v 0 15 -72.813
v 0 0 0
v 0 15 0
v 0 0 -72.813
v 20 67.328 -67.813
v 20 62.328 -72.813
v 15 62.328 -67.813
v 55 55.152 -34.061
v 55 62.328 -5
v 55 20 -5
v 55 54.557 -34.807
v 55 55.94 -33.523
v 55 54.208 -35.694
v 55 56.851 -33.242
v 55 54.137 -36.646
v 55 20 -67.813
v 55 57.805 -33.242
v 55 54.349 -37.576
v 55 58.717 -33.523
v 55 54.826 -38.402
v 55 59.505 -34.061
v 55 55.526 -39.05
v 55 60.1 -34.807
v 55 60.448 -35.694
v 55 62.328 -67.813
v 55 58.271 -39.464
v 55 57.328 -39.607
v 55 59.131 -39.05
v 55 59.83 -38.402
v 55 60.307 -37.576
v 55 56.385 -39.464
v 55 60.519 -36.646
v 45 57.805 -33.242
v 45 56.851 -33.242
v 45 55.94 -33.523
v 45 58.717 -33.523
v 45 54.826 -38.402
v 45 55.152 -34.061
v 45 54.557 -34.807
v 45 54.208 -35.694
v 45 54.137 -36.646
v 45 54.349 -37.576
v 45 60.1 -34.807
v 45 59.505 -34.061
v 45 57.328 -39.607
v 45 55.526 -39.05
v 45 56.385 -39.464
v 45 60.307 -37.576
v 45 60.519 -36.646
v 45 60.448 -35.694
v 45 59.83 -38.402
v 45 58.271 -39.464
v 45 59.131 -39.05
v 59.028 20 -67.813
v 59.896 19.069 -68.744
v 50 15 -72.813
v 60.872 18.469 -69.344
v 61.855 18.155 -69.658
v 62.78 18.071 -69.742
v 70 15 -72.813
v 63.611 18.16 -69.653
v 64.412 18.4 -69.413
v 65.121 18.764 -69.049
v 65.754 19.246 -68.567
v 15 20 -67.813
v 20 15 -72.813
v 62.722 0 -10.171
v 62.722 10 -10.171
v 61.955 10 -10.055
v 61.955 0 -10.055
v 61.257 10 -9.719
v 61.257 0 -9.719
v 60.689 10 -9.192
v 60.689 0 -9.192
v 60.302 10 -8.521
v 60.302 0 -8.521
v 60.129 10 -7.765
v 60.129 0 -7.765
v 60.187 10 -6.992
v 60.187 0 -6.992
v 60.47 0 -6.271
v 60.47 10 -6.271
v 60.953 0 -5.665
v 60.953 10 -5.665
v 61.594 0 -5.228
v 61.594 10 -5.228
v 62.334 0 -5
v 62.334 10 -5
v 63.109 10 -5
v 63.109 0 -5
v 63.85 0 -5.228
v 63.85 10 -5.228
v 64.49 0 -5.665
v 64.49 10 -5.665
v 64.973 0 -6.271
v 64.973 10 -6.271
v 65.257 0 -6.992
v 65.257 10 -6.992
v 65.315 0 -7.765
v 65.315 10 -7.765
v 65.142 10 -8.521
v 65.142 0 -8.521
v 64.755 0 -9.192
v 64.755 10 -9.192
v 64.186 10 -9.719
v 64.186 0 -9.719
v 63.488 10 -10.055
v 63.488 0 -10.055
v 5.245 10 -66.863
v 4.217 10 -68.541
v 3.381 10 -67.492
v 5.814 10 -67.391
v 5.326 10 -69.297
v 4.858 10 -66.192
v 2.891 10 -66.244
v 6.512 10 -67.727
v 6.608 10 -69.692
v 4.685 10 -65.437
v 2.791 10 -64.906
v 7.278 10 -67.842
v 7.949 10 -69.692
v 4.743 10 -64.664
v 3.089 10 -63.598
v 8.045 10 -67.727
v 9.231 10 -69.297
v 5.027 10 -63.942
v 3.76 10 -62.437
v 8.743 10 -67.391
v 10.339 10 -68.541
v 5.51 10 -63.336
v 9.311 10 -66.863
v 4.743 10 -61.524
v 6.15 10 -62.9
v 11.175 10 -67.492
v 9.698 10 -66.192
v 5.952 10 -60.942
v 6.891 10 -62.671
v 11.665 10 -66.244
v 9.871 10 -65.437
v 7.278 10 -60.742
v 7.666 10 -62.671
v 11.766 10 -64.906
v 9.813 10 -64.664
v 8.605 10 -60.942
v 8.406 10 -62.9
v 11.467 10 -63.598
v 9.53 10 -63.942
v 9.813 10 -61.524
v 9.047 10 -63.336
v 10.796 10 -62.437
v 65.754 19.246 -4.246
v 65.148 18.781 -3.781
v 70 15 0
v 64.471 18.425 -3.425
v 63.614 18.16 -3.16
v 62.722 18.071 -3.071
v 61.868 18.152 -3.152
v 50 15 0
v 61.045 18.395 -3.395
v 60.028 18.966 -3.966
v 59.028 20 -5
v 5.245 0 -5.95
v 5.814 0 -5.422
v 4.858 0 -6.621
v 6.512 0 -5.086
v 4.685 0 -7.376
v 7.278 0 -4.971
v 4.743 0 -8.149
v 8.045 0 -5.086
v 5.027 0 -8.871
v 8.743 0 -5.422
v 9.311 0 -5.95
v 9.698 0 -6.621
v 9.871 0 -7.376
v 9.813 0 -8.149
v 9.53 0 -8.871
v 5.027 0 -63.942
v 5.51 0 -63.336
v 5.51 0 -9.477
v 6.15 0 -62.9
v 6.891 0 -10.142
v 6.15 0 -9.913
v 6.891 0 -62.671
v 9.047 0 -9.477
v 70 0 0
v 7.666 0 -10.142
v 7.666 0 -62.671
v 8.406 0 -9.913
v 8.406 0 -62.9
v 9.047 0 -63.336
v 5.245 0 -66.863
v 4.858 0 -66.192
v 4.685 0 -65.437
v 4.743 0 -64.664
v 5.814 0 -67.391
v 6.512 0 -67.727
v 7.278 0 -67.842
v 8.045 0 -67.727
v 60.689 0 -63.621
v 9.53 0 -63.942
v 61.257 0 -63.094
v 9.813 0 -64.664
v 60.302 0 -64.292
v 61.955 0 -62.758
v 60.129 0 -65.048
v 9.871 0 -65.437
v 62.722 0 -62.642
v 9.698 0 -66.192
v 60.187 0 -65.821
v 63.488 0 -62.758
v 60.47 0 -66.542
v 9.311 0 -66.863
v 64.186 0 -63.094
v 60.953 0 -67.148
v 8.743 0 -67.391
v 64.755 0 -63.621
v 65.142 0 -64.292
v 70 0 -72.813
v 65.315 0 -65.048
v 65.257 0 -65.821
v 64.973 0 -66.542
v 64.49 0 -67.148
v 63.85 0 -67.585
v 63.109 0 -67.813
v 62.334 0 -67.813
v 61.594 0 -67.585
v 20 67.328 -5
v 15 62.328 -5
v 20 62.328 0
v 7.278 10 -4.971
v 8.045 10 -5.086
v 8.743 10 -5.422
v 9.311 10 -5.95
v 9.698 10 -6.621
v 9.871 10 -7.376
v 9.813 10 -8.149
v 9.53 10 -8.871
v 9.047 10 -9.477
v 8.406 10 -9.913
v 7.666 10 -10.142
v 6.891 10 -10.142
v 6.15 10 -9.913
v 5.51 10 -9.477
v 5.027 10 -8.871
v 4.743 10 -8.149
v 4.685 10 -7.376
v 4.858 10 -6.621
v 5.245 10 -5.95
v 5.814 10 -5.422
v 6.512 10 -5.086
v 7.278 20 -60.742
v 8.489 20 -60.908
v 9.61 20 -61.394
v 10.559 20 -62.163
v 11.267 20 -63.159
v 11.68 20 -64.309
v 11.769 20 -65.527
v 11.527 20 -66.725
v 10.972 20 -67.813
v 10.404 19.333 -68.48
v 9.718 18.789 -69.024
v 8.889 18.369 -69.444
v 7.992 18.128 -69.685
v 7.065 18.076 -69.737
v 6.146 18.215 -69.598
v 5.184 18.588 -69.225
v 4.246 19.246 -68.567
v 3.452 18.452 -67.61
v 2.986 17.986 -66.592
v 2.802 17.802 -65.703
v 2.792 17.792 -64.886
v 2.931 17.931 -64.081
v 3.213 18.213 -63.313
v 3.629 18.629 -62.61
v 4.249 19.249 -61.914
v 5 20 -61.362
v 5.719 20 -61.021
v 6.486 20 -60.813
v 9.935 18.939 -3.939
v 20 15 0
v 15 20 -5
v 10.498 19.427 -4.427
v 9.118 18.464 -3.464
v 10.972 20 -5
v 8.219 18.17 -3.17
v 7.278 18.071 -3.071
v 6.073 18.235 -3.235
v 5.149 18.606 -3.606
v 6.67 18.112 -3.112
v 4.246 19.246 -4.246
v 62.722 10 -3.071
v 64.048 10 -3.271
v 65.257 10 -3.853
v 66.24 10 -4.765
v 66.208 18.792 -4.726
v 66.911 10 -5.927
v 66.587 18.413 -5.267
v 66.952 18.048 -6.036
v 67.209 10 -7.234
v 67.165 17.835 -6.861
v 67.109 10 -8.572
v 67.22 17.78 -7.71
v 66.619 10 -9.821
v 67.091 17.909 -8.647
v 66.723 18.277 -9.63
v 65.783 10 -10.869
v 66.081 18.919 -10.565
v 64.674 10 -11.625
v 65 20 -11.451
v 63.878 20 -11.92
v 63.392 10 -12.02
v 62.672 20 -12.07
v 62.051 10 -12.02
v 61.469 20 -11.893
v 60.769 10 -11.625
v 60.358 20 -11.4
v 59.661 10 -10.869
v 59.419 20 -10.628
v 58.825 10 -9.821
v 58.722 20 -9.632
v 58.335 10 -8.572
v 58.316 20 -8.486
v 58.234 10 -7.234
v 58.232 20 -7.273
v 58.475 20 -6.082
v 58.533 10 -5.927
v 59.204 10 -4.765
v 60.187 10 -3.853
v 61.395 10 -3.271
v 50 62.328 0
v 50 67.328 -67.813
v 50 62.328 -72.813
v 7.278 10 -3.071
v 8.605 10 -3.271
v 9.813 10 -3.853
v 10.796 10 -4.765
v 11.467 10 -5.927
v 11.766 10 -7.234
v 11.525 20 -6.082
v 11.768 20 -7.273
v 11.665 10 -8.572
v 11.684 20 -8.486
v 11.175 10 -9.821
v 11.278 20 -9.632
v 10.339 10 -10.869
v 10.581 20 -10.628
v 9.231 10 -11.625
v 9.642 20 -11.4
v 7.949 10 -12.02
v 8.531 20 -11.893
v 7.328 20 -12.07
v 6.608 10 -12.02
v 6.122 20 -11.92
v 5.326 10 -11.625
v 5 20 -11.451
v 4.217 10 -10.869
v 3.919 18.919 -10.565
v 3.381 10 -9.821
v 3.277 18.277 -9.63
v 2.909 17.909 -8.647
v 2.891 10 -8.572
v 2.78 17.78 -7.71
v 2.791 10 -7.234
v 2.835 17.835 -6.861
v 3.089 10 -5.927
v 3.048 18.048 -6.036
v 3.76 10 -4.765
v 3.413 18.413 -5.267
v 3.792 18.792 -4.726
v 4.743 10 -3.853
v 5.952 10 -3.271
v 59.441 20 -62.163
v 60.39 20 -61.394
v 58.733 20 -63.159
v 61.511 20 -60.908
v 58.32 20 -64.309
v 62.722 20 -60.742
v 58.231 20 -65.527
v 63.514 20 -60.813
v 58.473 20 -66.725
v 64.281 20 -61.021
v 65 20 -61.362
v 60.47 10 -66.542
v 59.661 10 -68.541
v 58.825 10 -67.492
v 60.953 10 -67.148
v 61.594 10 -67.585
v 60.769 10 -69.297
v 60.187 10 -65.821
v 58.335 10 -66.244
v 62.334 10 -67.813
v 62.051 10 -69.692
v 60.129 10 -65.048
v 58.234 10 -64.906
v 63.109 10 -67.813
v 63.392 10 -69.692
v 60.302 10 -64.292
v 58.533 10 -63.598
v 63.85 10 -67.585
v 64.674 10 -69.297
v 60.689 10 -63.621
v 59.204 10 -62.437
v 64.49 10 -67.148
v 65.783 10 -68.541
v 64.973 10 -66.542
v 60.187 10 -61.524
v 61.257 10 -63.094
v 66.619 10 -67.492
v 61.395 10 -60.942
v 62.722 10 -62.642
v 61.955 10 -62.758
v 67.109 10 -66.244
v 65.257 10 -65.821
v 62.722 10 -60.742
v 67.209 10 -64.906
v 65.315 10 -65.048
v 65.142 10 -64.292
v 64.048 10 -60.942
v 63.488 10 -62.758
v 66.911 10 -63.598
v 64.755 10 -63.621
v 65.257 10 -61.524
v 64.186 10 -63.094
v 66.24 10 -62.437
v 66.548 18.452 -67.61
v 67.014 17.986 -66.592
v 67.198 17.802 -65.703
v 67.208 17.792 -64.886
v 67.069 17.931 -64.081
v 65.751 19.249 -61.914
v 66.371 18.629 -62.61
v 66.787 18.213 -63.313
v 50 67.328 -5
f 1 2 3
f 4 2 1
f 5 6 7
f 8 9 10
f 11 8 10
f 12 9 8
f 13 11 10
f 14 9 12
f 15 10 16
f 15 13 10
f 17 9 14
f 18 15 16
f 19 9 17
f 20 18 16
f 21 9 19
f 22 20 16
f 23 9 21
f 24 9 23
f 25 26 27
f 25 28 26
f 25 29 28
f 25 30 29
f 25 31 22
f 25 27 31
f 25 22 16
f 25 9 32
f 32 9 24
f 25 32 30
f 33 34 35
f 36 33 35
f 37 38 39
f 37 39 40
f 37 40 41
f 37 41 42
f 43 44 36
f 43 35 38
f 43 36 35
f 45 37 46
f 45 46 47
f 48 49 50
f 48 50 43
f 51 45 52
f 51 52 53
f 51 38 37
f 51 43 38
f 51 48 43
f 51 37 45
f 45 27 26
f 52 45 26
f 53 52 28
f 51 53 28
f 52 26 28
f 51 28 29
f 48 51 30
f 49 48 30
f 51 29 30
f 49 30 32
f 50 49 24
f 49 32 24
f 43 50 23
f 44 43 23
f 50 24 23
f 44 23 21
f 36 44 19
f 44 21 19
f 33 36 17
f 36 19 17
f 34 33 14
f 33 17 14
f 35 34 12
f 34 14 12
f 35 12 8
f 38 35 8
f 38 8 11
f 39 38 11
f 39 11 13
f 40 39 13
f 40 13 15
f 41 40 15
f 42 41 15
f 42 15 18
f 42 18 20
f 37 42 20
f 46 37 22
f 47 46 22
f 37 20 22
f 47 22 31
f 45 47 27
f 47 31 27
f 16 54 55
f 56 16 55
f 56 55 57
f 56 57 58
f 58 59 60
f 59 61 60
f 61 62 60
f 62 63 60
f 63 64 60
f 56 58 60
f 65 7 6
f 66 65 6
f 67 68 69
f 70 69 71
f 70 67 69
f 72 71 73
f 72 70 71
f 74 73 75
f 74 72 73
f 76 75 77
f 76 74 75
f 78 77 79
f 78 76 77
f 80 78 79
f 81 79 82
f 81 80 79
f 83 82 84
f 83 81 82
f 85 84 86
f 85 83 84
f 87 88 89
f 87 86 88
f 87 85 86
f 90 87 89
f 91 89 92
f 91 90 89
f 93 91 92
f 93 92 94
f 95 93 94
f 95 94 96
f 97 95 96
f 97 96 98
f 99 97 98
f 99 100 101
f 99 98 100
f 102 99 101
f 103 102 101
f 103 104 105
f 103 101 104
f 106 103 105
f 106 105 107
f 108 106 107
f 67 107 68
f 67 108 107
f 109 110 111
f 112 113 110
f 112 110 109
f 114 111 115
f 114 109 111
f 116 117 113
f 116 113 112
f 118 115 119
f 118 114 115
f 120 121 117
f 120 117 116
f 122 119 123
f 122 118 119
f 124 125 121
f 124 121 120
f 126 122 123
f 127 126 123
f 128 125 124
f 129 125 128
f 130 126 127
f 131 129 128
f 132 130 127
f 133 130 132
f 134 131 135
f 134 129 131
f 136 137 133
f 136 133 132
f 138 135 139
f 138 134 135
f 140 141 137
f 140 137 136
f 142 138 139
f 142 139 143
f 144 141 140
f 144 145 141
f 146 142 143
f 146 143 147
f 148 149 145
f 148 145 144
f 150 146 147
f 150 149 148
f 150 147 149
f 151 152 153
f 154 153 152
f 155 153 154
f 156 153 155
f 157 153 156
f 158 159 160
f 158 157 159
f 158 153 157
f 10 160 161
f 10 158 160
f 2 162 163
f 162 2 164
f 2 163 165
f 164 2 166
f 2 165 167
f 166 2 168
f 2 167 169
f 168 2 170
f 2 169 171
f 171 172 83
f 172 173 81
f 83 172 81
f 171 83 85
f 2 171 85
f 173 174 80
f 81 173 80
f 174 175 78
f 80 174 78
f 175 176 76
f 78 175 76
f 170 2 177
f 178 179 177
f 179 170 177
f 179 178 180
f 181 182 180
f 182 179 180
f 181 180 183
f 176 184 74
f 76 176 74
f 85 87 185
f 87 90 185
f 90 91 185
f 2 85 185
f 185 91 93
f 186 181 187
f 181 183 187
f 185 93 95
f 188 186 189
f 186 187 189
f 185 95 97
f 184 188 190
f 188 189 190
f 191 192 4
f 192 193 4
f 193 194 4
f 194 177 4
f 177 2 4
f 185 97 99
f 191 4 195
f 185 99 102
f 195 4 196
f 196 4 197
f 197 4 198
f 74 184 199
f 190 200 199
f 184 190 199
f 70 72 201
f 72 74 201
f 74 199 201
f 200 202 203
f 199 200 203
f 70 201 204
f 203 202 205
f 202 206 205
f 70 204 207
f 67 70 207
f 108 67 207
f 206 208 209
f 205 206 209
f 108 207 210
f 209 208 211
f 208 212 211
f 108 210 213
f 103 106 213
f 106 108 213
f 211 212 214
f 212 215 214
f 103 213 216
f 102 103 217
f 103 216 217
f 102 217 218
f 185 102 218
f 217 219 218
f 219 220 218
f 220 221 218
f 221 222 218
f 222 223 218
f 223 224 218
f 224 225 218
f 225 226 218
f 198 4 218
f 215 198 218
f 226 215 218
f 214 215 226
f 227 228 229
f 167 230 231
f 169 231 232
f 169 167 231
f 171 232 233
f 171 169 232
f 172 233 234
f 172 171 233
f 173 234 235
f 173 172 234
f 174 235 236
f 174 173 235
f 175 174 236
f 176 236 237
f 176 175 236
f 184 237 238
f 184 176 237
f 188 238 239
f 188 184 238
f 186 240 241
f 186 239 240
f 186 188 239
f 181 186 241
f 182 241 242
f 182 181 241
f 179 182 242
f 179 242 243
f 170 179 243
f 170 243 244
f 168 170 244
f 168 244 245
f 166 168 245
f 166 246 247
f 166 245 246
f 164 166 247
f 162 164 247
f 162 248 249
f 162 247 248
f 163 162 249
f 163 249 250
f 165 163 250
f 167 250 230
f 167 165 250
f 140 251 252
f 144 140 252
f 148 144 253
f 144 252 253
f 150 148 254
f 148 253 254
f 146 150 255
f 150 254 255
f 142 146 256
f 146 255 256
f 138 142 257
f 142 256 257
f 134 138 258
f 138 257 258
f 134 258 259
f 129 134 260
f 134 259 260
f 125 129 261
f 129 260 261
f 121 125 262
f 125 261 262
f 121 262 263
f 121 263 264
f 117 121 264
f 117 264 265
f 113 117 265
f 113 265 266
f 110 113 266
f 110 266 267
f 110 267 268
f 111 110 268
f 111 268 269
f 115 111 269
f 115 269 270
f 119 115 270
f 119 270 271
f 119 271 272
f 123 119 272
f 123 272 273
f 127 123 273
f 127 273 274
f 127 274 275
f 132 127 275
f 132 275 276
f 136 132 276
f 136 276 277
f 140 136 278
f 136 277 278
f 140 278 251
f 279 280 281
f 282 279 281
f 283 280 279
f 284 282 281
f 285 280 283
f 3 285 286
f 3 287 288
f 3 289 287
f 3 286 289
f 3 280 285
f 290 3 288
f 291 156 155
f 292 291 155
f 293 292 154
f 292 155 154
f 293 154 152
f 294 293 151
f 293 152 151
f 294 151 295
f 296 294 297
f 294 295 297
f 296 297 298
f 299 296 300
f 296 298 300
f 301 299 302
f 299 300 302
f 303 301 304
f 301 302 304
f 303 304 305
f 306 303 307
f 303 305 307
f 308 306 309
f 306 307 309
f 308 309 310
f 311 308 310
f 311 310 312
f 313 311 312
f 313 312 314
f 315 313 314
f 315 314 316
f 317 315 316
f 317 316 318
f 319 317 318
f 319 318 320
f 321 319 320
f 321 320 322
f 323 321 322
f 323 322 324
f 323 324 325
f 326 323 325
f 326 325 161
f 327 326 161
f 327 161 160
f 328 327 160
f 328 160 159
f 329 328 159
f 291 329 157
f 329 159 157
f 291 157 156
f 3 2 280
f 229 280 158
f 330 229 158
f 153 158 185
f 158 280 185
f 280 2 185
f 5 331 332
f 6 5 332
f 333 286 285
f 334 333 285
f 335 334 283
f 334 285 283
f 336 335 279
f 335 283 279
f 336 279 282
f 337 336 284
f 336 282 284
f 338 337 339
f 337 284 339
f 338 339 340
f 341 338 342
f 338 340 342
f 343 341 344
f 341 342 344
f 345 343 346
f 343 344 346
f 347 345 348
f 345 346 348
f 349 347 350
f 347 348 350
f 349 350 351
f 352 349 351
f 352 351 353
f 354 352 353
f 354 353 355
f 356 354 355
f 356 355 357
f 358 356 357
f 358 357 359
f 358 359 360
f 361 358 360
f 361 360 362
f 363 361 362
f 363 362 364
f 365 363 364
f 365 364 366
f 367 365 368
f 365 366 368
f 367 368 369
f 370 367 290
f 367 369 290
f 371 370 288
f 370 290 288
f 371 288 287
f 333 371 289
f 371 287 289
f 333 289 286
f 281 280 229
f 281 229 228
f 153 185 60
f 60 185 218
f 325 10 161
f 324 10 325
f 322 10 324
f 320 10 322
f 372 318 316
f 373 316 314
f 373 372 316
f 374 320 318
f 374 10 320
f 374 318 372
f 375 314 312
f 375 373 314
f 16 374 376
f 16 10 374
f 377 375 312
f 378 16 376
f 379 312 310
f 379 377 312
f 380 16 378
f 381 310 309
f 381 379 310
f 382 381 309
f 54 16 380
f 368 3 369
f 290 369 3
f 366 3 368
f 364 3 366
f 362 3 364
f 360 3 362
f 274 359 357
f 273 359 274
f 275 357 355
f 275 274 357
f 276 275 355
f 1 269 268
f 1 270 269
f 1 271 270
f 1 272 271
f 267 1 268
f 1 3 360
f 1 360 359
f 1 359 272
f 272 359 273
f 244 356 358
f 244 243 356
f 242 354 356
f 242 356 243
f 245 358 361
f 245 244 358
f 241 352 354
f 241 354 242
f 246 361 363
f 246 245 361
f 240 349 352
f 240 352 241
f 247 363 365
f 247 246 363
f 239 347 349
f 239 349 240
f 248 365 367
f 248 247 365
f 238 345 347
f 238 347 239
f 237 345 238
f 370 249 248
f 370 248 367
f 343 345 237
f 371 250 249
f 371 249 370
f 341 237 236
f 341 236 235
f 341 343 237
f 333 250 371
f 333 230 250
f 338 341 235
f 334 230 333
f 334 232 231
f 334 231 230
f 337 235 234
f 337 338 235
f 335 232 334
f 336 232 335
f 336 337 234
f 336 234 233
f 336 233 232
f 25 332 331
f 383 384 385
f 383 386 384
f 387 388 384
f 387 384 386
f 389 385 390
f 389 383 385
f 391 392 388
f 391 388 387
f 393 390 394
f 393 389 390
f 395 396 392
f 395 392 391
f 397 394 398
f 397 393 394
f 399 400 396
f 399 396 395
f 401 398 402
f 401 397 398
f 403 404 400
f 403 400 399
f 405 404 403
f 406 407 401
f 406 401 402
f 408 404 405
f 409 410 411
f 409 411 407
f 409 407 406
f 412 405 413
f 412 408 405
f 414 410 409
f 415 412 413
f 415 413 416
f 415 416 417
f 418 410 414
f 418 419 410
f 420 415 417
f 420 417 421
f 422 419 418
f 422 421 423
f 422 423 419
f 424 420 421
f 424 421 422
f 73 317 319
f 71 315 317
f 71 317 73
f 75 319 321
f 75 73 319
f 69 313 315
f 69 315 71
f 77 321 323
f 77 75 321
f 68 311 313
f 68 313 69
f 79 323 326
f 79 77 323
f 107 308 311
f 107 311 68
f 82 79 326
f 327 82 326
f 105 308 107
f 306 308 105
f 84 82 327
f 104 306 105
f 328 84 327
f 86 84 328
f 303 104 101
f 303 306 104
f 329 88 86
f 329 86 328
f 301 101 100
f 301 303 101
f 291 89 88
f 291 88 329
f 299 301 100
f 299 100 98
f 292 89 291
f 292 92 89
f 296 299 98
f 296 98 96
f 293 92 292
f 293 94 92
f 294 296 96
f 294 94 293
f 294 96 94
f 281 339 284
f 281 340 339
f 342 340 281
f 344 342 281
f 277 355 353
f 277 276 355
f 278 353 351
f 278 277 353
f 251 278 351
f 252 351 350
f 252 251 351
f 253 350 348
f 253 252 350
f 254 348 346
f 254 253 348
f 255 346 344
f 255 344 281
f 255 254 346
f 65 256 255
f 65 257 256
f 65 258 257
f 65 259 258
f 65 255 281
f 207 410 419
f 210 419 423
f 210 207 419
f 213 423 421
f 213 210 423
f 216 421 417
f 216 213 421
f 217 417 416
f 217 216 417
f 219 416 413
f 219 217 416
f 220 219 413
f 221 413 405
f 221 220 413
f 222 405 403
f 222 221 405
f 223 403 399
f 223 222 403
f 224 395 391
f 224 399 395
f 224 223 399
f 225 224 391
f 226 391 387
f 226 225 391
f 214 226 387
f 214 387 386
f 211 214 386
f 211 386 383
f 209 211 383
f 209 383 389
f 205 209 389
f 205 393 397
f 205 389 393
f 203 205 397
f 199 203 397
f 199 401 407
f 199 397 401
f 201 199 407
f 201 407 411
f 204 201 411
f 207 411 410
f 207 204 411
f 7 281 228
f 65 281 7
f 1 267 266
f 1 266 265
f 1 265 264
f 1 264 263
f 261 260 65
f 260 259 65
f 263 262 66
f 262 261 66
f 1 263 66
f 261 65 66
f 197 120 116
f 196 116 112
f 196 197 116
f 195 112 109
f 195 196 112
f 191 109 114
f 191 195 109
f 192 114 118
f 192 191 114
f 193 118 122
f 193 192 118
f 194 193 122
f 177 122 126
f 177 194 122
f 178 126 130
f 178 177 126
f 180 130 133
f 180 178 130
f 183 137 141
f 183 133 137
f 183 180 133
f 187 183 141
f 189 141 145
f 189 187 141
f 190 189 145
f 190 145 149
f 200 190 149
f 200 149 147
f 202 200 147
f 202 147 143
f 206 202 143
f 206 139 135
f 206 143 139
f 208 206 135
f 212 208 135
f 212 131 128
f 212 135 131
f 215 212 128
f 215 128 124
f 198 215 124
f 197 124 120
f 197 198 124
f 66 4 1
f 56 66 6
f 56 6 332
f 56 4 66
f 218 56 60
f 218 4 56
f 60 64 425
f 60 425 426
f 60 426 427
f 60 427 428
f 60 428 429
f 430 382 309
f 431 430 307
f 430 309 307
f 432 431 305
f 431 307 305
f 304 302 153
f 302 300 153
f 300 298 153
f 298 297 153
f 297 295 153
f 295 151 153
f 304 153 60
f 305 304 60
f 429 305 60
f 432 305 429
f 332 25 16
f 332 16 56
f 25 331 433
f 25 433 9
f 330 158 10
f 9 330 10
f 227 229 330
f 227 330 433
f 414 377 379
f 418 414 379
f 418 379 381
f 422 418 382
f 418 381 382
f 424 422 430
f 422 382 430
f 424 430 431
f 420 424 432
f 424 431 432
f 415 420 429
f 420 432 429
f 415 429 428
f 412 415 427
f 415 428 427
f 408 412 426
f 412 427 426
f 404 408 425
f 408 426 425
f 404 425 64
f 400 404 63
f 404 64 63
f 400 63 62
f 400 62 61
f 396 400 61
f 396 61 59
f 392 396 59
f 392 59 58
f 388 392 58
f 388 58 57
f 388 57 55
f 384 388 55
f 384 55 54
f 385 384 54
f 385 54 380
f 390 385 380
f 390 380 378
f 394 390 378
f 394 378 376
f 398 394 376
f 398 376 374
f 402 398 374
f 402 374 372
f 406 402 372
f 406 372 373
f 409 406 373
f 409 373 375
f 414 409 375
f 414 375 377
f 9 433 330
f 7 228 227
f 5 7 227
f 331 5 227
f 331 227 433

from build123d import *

# Parameters (mm, degrees)
SKETCH1_W           = 70
SKETCH1_H           = 72.813008
SKETCH1_R           = 2.6
BOSS_EXTRUDE1_DEPTH = 20
SKETCH2_R           = 4.5
CUT_EXTRUDE1_DEPTH  = 10
SKETCH3_W           = 40
SKETCH3_H           = 72.813008
BOSS_EXTRUDE2_DEPTH = 47.328226
SKETCH5_R           = 3.2
CUT_EXTRUDE2_DEPTH  = 10


with BuildPart() as part:
    # Sketch1 → Boss-Extrude1 (new body)
    with BuildSketch(Plane(origin=(0, 0, 0), x_dir=(1, 0, 0), z_dir=(0, 1, 0))):
        with Locations((35, 36.406504)):
            Rectangle(SKETCH1_W, SKETCH1_H)
        with Locations(Location((62.721774771, 65.242301259, 0), (0, 0, 270))):
            Circle(SKETCH1_R, mode=Mode.SUBTRACT)
        with Locations(Location((7.278225229, 65.242301259, 0), (0, 0, 90))):
            Circle(SKETCH1_R, mode=Mode.SUBTRACT)
        with Locations(Location((62.721774771, 7.570706741, 0), (0, 0, 90))):
            Circle(SKETCH1_R, mode=Mode.SUBTRACT)
        with Locations(Location((7.278225229, 7.570706741, 0), (0, 0, 270))):
            Circle(SKETCH1_R, mode=Mode.SUBTRACT)
    extrude(amount=BOSS_EXTRUDE1_DEPTH)

    # Sketch2 → Cut-Extrude1 (cut)
    with BuildSketch(Plane(origin=(0, 20, 0), x_dir=(1, 0, 0), z_dir=(0, 1, 0))):
        with Locations(Location((62.721774771, 65.242301259, 0), (0, 0, 270))):
            Circle(SKETCH2_R)
        with Locations(Location((7.278225229, 65.242301259, 0), (0, 0, 270))):
            Circle(SKETCH2_R)
        with Locations(Location((7.278225229, 7.570706741, 0), (0, 0, 270))):
            Circle(SKETCH2_R)
        with Locations(Location((62.721774771, 7.570706741, 0), (0, 0, 270))):
            Circle(SKETCH2_R)
    extrude(amount=-CUT_EXTRUDE1_DEPTH, mode=Mode.SUBTRACT)

    # Sketch3 → Boss-Extrude2 (add)
    with BuildSketch(Plane(origin=(0, 20, 0), x_dir=(1, 0, 0), z_dir=(0, 1, 0))):
        with Locations((35, 36.406504)):
            Rectangle(SKETCH3_W, SKETCH3_H)
    extrude(amount=BOSS_EXTRUDE2_DEPTH)

    # Sketch5 → Cut-Extrude2 (cut)
    with BuildSketch(Plane(origin=(55, 0, 0), x_dir=(0, 0, -1), z_dir=(1, 0, 0))):
        with Locations((36.406504, 57.328226)):
            Circle(SKETCH5_R)
    extrude(amount=-CUT_EXTRUDE2_DEPTH, mode=Mode.SUBTRACT)

    # Chamfer1
    # the kernel refuses this chamfer: 5 mm, written as the material it takes off along each edge
    with BuildSketch(Plane(origin=(51.666666667, 63.994892667, -3.333333333), x_dir=(0, 0.7071067811865475, -0.7071067811865475), z_dir=(0.5773502691896257, 0.5773502691896257, 0.5773502691896257)), Plane(origin=(18.333333333, 63.994892667, -3.333333333), x_dir=(-0.7071067811865475, 0, -0.7071067811865475), z_dir=(-0.5773502691896257, 0.5773502691896257, 0.5773502691896257))) as chamfer1_piece_1:
        Polygon((-3.535533906, 2.041241452), (3.535533906, 2.041241452), (0, -4.082482905), align=None)
    extrude(amount=6.350852961, mode=Mode.SUBTRACT)
    with BuildSketch(Plane(origin=(51.666666667, 63.994892667, -69.479674667), x_dir=(0, 0.7071067811865475, 0.7071067811865475), z_dir=(0.5773502691896257, 0.5773502691896257, -0.5773502691896257)), Plane(origin=(18.333333333, 63.994892667, -69.479674667), x_dir=(-0.7071067811865472, 0, 0.7071067811865478), z_dir=(-0.5773502691896258, 0.5773502691896258, -0.5773502691896255))) as chamfer1_piece_2:
        Polygon((-3.535533906, -2.041241452), (3.535533906, -2.041241452), (0, 4.082482905), align=None)
    extrude(amount=6.350852961, mode=Mode.SUBTRACT)
    with BuildSketch(Plane(origin=(70, 20, 12.85841494), x_dir=(-0.9996219169112968, 0.027495876610586282, 0), z_dir=(0, 0, -1)), Plane(origin=(15, 67.328226, 12.85841494), x_dir=(-0.027495876610586317, -0.9996219169112968, 0), z_dir=(0, 0, -1))) as chamfer1_piece_3:
        with BuildLine():
            Line((5.143365976, 0), (-0.282735774, -5.135588968))
            Line((-0.282735774, -5.135588968), (-0.382697966, -5.13283938))
            ThreePointArc((-0.382697966, -5.13283938), (-0.170646135, -2.566989148), (-0.099962192, 0.002749588))
            Line((-0.099962192, 0.002749588), (0.002749588, 0.099962192))
            ThreePointArc((0.002749588, 0.099962192), (2.572488324, 0.029278248), (5.146115564, 0.099962192))
            Line((5.146115564, 0.099962192), (5.143365976, 0))
        make_face()
    extrude(amount=98.52983788, mode=Mode.SUBTRACT)
    with BuildSketch(Plane(origin=(82.85841494, 20, -72.813008), x_dir=(0, 0.027495876610586282, 0.9996219169112968), z_dir=(-1, 0, 0)), Plane(origin=(15, 20, -72.813008), x_dir=(0, 0.027495876610586282, 0.9996219169112968), z_dir=(-1, 0, 0))) as chamfer1_piece_4:
        with BuildLine():
            Line((5.143365976, 0), (-0.282735774, -5.135588968))
            Line((-0.282735774, -5.135588968), (-0.382697966, -5.13283938))
            ThreePointArc((-0.382697966, -5.13283938), (-0.170646135, -2.566989148), (-0.099962192, 0.002749588))
            Line((-0.099962192, 0.002749588), (0.002749588, 0.099962192))
            ThreePointArc((0.002749588, 0.099962192), (2.572488324, 0.029278248), (5.146115564, 0.099962192))
            Line((5.146115564, 0.099962192), (5.143365976, 0))
        make_face()
    extrude(amount=27.85841494, mode=Mode.SUBTRACT)
    with BuildSketch(Plane(origin=(0, 20, -85.67142294), x_dir=(-0.027495876610586372, -0.9996219169112968, 0), z_dir=(0, 0, 1)), Plane(origin=(55, 67.328226, -85.67142294), x_dir=(-0.9996219169112968, 0.0274958766105877, 0), z_dir=(0, 0, 1))) as chamfer1_piece_5:
        with BuildLine():
            Line((5.143365976, 0), (-0.282735774, 5.135588968))
            Line((-0.282735774, 5.135588968), (-0.382697966, 5.13283938))
            ThreePointArc((-0.382697966, 5.13283938), (-0.170646135, 2.566989148), (-0.099962192, -0.002749588))
            Line((-0.099962192, -0.002749588), (0.002749588, -0.099962192))
            ThreePointArc((0.002749588, -0.099962192), (2.572488324, -0.029278248), (5.146115564, -0.099962192))
            Line((5.146115564, -0.099962192), (5.143365976, 0))
        make_face()
    extrude(amount=98.52983788, mode=Mode.SUBTRACT)
    with BuildSketch(Plane(origin=(55, 20, 0), x_dir=(0, -0.9996219169112968, 0.027495876610586372), z_dir=(1, 0, 0)), Plane(origin=(-12.85841494, 20, 0), x_dir=(0, -0.9996219169112968, 0.027495876610586372), z_dir=(1, 0, 0))) as chamfer1_piece_6:
        with BuildLine():
            Line((5.143365976, 0), (-0.282735774, 5.135588968))
            Line((-0.282735774, 5.135588968), (-0.382697966, 5.13283938))
            ThreePointArc((-0.382697966, 5.13283938), (-0.170646135, 2.566989148), (-0.099962192, -0.002749588))
            Line((-0.099962192, -0.002749588), (0.002749588, -0.099962192))
            ThreePointArc((0.002749588, -0.099962192), (2.572488324, -0.029278248), (5.146115564, -0.099962192))
            Line((5.146115564, -0.099962192), (5.143365976, 0))
        make_face()
    extrude(amount=27.85841494, mode=Mode.SUBTRACT)
    with BuildSketch(Plane(origin=(55, 20, 0), x_dir=(-0.9996219169112968, 0, 0.027495876610586372), z_dir=(0, 1, 0)), Plane(origin=(55, 20, -72.813008), x_dir=(0.027495876610586282, 0, 0.9996219169112968), z_dir=(0, 1, 0))) as chamfer1_piece_7:
        with BuildLine():
            Line((5.143365976, 0), (-0.282735774, -5.135588968))
            Line((-0.282735774, -5.135588968), (-0.382697966, -5.13283938))
            ThreePointArc((-0.382697966, -5.13283938), (-0.170646135, -2.566989148), (-0.099962192, 0.002749588))
            Line((-0.099962192, 0.002749588), (0.002749588, 0.099962192))
            ThreePointArc((0.002749588, 0.099962192), (2.572488324, 0.029278248), (5.146115564, 0.099962192))
            Line((5.146115564, 0.099962192), (5.143365976, 0))
        make_face()
    extrude(amount=60.18664094, mode=Mode.SUBTRACT)
    with BuildSketch(Plane(origin=(15, 20, -72.813008), x_dir=(-0.027495876610586282, 0, 0.9996219169112968), z_dir=(0, 1, 0)), Plane(origin=(15, 20, 0), x_dir=(0.9996219169112968, 0, 0.027495876610586372), z_dir=(0, 1, 0))) as chamfer1_piece_8:
        with BuildLine():
            Line((5.143365976, 0), (-0.282735774, 5.135588968))
            Line((-0.282735774, 5.135588968), (-0.382697966, 5.13283938))
            ThreePointArc((-0.382697966, 5.13283938), (-0.170646135, 2.566989148), (-0.099962192, -0.002749588))
            Line((-0.099962192, -0.002749588), (0.002749588, -0.099962192))
            ThreePointArc((0.002749588, -0.099962192), (2.572488324, -0.029278248), (5.146115564, -0.099962192))
            Line((5.146115564, -0.099962192), (5.143365976, 0))
        make_face()
    extrude(amount=60.18664094, mode=Mode.SUBTRACT)
    with BuildSketch(Plane(origin=(2.14158506, 67.328226, -72.813008), x_dir=(0, 0.027495876610587663, 0.9996219169112968), z_dir=(1, 0, 0))) as chamfer1_piece_9:
        with BuildLine():
            Line((5.143365976, 0), (-0.282735774, 5.135588968))
            Line((-0.282735774, 5.135588968), (-0.382697966, 5.13283938))
            ThreePointArc((-0.382697966, 5.13283938), (-0.170646135, 2.566989148), (-0.099962192, -0.002749588))
            Line((-0.099962192, -0.002749588), (0.002749588, -0.099962192))
            ThreePointArc((0.002749588, -0.099962192), (2.572488324, -0.029278248), (5.146115564, -0.099962192))
            Line((5.146115564, -0.099962192), (5.143365976, 0))
        make_face()
    extrude(amount=65.71682988, mode=Mode.SUBTRACT)
    with BuildSketch(Plane(origin=(67.85841494, 67.328226, 0), x_dir=(0, -0.9996219169112968, 0.027495876610586372), z_dir=(-1, 0, 0))) as chamfer1_piece_10:
        with BuildLine():
            Line((5.143365976, 0), (-0.282735774, -5.135588968))
            Line((-0.282735774, -5.135588968), (-0.382697966, -5.13283938))
            ThreePointArc((-0.382697966, -5.13283938), (-0.170646135, -2.566989148), (-0.099962192, 0.002749588))
            Line((-0.099962192, 0.002749588), (0.002749588, 0.099962192))
            ThreePointArc((0.002749588, 0.099962192), (2.572488324, 0.029278248), (5.146115564, 0.099962192))
            Line((5.146115564, 0.099962192), (5.143365976, 0))
        make_face()
    extrude(amount=65.71682988, mode=Mode.SUBTRACT)
    with BuildSketch(Plane(origin=(55, 7.14158506, -72.813008), x_dir=(0.027495876610586282, 0, 0.9996219169112968), z_dir=(0, 1, 0))) as chamfer1_piece_11a_section:
        with BuildLine():
            Line((5.143365976, 0), (-0.282735774, -5.135588968))
            Line((-0.282735774, -5.135588968), (-0.382697966, -5.13283938))
            ThreePointArc((-0.382697966, -5.13283938), (-0.170646135, -2.566989148), (-0.099962192, 0.002749588))
            Line((-0.099962192, 0.002749588), (0.002749588, 0.099962192))
            ThreePointArc((0.002749588, 0.099962192), (2.572488324, 0.029278248), (5.146115564, 0.099962192))
            Line((5.146115564, 0.099962192), (5.143365976, 0))
        make_face()
    chamfer1_piece_11a = extrude(amount=73.04505588, mode=Mode.PRIVATE)
    chamfer1_piece_11a = split(chamfer1_piece_11a, bisect_by=Plane(origin=(53.351031866, 20, -71.164039866), z_dir=(0, -1, 0)), keep=Keep.TOP, mode=Mode.PRIVATE)
    with BuildSketch(Plane(origin=(82.85841494, 20, -72.813008), x_dir=(0, 0.027495876610586282, 0.9996219169112968), z_dir=(-1, 0, 0))) as chamfer1_piece_11b_section:
        with BuildLine():
            Line((5.143365976, 0), (-0.282735774, -5.135588968))
            Line((-0.282735774, -5.135588968), (-0.382697966, -5.13283938))
            ThreePointArc((-0.382697966, -5.13283938), (-0.170646135, -2.566989148), (-0.099962192, 0.002749588))
            Line((-0.099962192, 0.002749588), (0.002749588, 0.099962192))
            ThreePointArc((0.002749588, 0.099962192), (2.572488324, 0.029278248), (5.146115564, 0.099962192))
            Line((5.146115564, 0.099962192), (5.143365976, 0))
        make_face()
    chamfer1_piece_11b = extrude(amount=40.71682988, mode=Mode.PRIVATE)
    chamfer1_piece_11b = split(chamfer1_piece_11b, bisect_by=Plane(origin=(55, 18.351031866, -71.164039866), z_dir=(-1, 0, 0)), keep=Keep.TOP, mode=Mode.PRIVATE)
    chamfer1_piece_11 = chamfer1_piece_11a & chamfer1_piece_11b
    add(chamfer1_piece_11, mode=Mode.SUBTRACT)
    with BuildSketch(Plane(origin=(55, 7.14158506, 0), x_dir=(-0.9996219169112968, 0, 0.027495876610586372), z_dir=(0, 1, 0))) as chamfer1_piece_12a_section:
        with BuildLine():
            Line((5.143365976, 0), (-0.282735774, -5.135588968))
            Line((-0.282735774, -5.135588968), (-0.382697966, -5.13283938))
            ThreePointArc((-0.382697966, -5.13283938), (-0.170646135, -2.566989148), (-0.099962192, 0.002749588))
            Line((-0.099962192, 0.002749588), (0.002749588, 0.099962192))
            ThreePointArc((0.002749588, 0.099962192), (2.572488324, 0.029278248), (5.146115564, 0.099962192))
            Line((5.146115564, 0.099962192), (5.143365976, 0))
        make_face()
    chamfer1_piece_12a = extrude(amount=73.04505588, mode=Mode.PRIVATE)
    chamfer1_piece_12a = split(chamfer1_piece_12a, bisect_by=Plane(origin=(53.351031866, 20, -1.648968134), z_dir=(0, -1, 0)), keep=Keep.TOP, mode=Mode.PRIVATE)
    with BuildSketch(Plane(origin=(42.14158506, 20, 0), x_dir=(0, -0.9996219169112968, 0.027495876610586372), z_dir=(1, 0, 0))) as chamfer1_piece_12b_section:
        with BuildLine():
            Line((5.143365976, 0), (-0.282735774, 5.135588968))
            Line((-0.282735774, 5.135588968), (-0.382697966, 5.13283938))
            ThreePointArc((-0.382697966, 5.13283938), (-0.170646135, 2.566989148), (-0.099962192, -0.002749588))
            Line((-0.099962192, -0.002749588), (0.002749588, -0.099962192))
            ThreePointArc((0.002749588, -0.099962192), (2.572488324, -0.029278248), (5.146115564, -0.099962192))
            Line((5.146115564, -0.099962192), (5.143365976, 0))
        make_face()
    chamfer1_piece_12b = extrude(amount=40.71682988, mode=Mode.PRIVATE)
    chamfer1_piece_12b = split(chamfer1_piece_12b, bisect_by=Plane(origin=(55, 18.351031866, -1.648968134), z_dir=(-1, 0, 0)), keep=Keep.TOP, mode=Mode.PRIVATE)
    chamfer1_piece_12 = chamfer1_piece_12a & chamfer1_piece_12b
    add(chamfer1_piece_12, mode=Mode.SUBTRACT)
    with BuildSketch(Plane(origin=(27.85841494, 20, -72.813008), x_dir=(0, 0.027495876610586282, 0.9996219169112968), z_dir=(-1, 0, 0))) as chamfer1_piece_13a_section:
        with BuildLine():
            Line((5.143365976, 0), (-0.282735774, -5.135588968))
            Line((-0.282735774, -5.135588968), (-0.382697966, -5.13283938))
            ThreePointArc((-0.382697966, -5.13283938), (-0.170646135, -2.566989148), (-0.099962192, 0.002749588))
            Line((-0.099962192, 0.002749588), (0.002749588, 0.099962192))
            ThreePointArc((0.002749588, 0.099962192), (2.572488324, 0.029278248), (5.146115564, 0.099962192))
            Line((5.146115564, 0.099962192), (5.143365976, 0))
        make_face()
    chamfer1_piece_13a = extrude(amount=40.71682988, mode=Mode.PRIVATE)
    chamfer1_piece_13a = split(chamfer1_piece_13a, bisect_by=Plane(origin=(15, 18.351031866, -71.164039866), z_dir=(1, 0, 0)), keep=Keep.TOP, mode=Mode.PRIVATE)
    with BuildSketch(Plane(origin=(15, 7.14158506, -72.813008), x_dir=(-0.027495876610586282, 0, 0.9996219169112968), z_dir=(0, 1, 0))) as chamfer1_piece_13b_section:
        with BuildLine():
            Line((5.143365976, 0), (-0.282735774, 5.135588968))
            Line((-0.282735774, 5.135588968), (-0.382697966, 5.13283938))
            ThreePointArc((-0.382697966, 5.13283938), (-0.170646135, 2.566989148), (-0.099962192, -0.002749588))
            Line((-0.099962192, -0.002749588), (0.002749588, -0.099962192))
            ThreePointArc((0.002749588, -0.099962192), (2.572488324, -0.029278248), (5.146115564, -0.099962192))
            Line((5.146115564, -0.099962192), (5.143365976, 0))
        make_face()
    chamfer1_piece_13b = extrude(amount=73.04505588, mode=Mode.PRIVATE)
    chamfer1_piece_13b = split(chamfer1_piece_13b, bisect_by=Plane(origin=(16.648968134, 20, -71.164039866), z_dir=(0, -1, 0)), keep=Keep.TOP, mode=Mode.PRIVATE)
    chamfer1_piece_13 = chamfer1_piece_13a & chamfer1_piece_13b
    add(chamfer1_piece_13, mode=Mode.SUBTRACT)
    with BuildSketch(Plane(origin=(-12.85841494, 20, 0), x_dir=(0, -0.9996219169112968, 0.027495876610586372), z_dir=(1, 0, 0))) as chamfer1_piece_14a_section:
        with BuildLine():
            Line((5.143365976, 0), (-0.282735774, 5.135588968))
            Line((-0.282735774, 5.135588968), (-0.382697966, 5.13283938))
            ThreePointArc((-0.382697966, 5.13283938), (-0.170646135, 2.566989148), (-0.099962192, -0.002749588))
            Line((-0.099962192, -0.002749588), (0.002749588, -0.099962192))
            ThreePointArc((0.002749588, -0.099962192), (2.572488324, -0.029278248), (5.146115564, -0.099962192))
            Line((5.146115564, -0.099962192), (5.143365976, 0))
        make_face()
    chamfer1_piece_14a = extrude(amount=40.71682988, mode=Mode.PRIVATE)
    chamfer1_piece_14a = split(chamfer1_piece_14a, bisect_by=Plane(origin=(15, 18.351031866, -1.648968134), z_dir=(1, 0, 0)), keep=Keep.TOP, mode=Mode.PRIVATE)
    with BuildSketch(Plane(origin=(15, 7.14158506, 0), x_dir=(0.9996219169112968, 0, 0.027495876610586372), z_dir=(0, 1, 0))) as chamfer1_piece_14b_section:
        with BuildLine():
            Line((5.143365976, 0), (-0.282735774, 5.135588968))
            Line((-0.282735774, 5.135588968), (-0.382697966, 5.13283938))
            ThreePointArc((-0.382697966, 5.13283938), (-0.170646135, 2.566989148), (-0.099962192, -0.002749588))
            Line((-0.099962192, -0.002749588), (0.002749588, -0.099962192))
            ThreePointArc((0.002749588, -0.099962192), (2.572488324, -0.029278248), (5.146115564, -0.099962192))
            Line((5.146115564, -0.099962192), (5.143365976, 0))
        make_face()
    chamfer1_piece_14b = extrude(amount=73.04505588, mode=Mode.PRIVATE)
    chamfer1_piece_14b = split(chamfer1_piece_14b, bisect_by=Plane(origin=(16.648968134, 20, -1.648968134), z_dir=(0, -1, 0)), keep=Keep.TOP, mode=Mode.PRIVATE)
    chamfer1_piece_14 = chamfer1_piece_14a & chamfer1_piece_14b
    add(chamfer1_piece_14, mode=Mode.SUBTRACT)


solid = part.part
